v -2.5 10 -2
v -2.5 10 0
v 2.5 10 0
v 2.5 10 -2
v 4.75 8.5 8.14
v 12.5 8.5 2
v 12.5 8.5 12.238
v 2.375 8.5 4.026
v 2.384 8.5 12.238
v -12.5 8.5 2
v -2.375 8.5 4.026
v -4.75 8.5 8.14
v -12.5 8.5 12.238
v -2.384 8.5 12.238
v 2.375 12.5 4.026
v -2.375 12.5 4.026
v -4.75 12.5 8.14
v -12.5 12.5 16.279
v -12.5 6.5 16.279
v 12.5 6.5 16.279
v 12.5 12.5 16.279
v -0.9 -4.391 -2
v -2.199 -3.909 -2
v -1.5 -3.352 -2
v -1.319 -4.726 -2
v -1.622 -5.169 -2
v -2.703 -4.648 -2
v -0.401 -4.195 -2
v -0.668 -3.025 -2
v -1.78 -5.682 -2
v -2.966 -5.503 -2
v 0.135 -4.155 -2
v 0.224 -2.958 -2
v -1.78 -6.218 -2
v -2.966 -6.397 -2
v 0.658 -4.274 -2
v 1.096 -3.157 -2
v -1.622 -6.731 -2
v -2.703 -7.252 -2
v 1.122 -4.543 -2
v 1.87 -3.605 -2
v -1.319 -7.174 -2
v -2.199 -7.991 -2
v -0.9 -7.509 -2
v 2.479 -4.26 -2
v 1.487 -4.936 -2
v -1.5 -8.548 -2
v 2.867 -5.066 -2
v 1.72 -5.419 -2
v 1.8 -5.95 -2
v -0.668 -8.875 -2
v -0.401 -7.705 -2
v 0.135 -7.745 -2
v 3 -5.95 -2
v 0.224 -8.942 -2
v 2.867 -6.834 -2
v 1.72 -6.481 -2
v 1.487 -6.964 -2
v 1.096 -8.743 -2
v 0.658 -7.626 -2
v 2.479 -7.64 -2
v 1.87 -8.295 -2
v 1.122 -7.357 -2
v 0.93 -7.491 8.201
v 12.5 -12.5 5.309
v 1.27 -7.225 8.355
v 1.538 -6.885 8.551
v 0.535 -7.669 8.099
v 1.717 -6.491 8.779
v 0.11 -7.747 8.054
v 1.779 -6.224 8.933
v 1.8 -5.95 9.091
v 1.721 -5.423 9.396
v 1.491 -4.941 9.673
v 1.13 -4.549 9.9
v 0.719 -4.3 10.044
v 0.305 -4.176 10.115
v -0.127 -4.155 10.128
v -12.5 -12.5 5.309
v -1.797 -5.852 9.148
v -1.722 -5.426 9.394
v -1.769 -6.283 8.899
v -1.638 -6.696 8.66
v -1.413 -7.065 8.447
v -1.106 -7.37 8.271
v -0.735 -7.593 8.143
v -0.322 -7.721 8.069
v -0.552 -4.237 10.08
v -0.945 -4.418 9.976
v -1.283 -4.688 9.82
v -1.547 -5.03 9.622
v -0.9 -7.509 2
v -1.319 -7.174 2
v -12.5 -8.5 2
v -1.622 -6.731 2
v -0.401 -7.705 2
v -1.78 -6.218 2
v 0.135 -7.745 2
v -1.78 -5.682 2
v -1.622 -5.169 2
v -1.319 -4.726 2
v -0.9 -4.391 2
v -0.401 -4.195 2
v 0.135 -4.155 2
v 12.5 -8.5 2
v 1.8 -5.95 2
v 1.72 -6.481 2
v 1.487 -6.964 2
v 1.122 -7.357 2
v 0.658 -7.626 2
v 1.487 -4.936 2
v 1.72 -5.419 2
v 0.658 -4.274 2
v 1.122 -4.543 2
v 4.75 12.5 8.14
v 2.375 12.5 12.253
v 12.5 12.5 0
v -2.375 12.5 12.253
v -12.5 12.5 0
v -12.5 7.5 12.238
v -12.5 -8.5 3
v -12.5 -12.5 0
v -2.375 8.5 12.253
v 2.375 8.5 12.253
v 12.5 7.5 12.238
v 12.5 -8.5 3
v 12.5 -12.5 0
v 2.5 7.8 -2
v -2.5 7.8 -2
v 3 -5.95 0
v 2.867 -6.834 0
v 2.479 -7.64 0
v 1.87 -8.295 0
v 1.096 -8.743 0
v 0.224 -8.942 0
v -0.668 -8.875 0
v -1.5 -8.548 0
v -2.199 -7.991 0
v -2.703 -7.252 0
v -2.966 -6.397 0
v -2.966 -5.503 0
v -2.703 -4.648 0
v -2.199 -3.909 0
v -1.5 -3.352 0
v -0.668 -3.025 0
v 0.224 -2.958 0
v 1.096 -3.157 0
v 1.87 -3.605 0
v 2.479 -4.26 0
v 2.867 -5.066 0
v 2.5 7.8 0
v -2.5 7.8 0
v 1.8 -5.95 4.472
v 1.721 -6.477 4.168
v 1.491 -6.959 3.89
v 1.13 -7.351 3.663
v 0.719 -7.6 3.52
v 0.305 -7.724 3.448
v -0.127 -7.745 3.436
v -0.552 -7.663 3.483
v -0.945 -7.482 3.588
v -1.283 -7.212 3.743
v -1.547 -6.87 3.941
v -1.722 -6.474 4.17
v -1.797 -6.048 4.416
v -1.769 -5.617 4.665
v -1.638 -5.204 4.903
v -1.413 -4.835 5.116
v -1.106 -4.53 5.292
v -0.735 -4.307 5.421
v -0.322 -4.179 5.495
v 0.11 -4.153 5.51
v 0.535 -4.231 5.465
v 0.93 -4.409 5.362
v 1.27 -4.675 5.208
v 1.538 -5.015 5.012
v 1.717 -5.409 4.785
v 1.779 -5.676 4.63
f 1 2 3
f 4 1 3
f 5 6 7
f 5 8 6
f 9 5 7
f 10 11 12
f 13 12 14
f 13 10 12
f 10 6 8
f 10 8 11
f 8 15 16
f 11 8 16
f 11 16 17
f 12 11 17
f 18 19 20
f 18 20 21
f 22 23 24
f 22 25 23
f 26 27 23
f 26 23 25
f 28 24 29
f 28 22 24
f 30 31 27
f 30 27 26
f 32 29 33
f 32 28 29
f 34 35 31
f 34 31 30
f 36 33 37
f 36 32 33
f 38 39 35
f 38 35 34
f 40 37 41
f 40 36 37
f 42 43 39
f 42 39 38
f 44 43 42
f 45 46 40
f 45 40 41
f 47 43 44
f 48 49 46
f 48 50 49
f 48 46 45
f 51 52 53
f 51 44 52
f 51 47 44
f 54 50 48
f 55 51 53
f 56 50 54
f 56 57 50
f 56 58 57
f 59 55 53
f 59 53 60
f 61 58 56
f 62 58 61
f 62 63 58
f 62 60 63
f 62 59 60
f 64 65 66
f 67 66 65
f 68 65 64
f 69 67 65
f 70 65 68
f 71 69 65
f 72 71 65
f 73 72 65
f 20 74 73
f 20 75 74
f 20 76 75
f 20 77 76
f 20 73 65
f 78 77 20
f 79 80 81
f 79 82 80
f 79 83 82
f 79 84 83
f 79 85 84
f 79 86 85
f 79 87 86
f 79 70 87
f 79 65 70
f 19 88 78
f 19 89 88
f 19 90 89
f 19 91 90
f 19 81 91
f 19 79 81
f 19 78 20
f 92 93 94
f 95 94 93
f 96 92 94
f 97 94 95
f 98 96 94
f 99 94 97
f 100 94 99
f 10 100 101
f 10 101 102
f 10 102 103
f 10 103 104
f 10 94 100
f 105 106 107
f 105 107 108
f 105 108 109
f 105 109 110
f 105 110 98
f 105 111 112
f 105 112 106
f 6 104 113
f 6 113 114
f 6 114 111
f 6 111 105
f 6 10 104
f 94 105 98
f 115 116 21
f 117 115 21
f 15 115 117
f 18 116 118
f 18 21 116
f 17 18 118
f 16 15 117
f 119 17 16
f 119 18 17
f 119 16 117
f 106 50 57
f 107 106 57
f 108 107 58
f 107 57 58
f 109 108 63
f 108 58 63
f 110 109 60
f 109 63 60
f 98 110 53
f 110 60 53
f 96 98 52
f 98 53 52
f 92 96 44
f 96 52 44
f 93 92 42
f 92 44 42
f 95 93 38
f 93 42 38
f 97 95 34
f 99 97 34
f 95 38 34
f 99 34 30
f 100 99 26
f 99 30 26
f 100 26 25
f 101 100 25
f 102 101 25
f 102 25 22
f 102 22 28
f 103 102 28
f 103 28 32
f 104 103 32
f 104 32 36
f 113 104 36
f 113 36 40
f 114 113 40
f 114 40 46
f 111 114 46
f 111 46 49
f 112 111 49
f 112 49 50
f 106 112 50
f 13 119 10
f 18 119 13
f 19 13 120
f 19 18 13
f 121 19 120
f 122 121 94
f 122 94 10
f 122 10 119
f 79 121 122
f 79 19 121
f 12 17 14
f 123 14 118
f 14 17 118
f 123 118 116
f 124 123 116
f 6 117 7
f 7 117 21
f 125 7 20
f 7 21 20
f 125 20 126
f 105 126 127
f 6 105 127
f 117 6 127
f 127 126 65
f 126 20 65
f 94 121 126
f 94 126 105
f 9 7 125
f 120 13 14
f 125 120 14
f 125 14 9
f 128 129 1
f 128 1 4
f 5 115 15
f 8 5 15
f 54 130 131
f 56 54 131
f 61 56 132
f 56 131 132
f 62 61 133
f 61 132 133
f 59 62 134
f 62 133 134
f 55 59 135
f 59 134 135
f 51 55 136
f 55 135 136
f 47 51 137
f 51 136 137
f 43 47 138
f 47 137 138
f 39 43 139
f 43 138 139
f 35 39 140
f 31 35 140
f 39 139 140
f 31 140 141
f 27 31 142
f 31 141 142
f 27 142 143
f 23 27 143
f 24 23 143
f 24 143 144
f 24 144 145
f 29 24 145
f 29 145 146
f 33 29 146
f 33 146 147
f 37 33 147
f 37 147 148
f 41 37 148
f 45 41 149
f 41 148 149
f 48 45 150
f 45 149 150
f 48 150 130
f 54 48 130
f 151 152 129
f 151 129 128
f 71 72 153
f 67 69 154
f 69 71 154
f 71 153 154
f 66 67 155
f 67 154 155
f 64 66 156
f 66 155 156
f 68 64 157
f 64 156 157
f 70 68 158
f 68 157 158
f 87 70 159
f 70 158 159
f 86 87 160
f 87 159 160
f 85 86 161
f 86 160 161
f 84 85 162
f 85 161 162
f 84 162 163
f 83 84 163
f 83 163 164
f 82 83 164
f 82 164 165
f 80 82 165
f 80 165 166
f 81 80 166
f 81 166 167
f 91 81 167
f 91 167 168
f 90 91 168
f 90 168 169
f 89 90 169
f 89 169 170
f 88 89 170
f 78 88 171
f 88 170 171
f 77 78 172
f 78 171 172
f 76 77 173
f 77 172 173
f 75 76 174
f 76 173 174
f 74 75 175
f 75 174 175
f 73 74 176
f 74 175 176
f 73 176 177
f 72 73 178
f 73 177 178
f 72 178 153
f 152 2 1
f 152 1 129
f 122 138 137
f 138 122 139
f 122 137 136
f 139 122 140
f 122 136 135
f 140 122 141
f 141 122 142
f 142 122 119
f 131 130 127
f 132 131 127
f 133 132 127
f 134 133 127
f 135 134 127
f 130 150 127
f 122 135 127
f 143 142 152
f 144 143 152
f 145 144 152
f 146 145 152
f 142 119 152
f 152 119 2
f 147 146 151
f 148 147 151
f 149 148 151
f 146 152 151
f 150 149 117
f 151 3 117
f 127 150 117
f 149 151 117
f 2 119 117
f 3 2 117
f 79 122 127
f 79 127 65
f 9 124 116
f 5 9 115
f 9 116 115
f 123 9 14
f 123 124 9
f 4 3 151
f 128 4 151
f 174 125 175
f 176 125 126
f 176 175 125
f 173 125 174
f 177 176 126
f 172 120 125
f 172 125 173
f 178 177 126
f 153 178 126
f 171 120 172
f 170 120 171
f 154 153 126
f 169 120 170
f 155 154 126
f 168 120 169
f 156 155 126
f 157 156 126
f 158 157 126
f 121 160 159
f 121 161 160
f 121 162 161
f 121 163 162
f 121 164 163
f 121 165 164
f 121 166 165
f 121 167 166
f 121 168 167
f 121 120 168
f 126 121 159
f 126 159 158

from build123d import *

# Parameters (mm, degrees)
F0_W     = 25
F0_H     = 25
F1_DEPTH = 2
F3_DEPTH = 25
F4_W     = 5
F4_H     = 2.2
F4_R     = 3
F5_DEPTH = 2
F6_R     = 1.8
F7_DEPTH = 18.280056
F9_DEPTH = 4


with BuildPart() as f1:
    # F0 (on Top) → F1 (new body)
    with BuildSketch(Plane.XY):
        Rectangle(F0_W, F0_H)
    extrude(amount=F1_DEPTH)

    # F2 (on face) → F3 (join, through all)
    with BuildSketch(Plane(origin=(-12.5, 0, 0), x_dir=(0, -1, 0), z_dir=(-1, 0, 0))):
        Polygon((-12.5, 16.279056), (-12.5, 2), (-8.5, 2), (-8.5, 12.237604), (-7.5, 12.237604), (8.5, 3), (8.5, 2), (12.5, 2), (12.5, 5.309401), (-6.5, 16.279056), align=None)
    extrude(amount=-F3_DEPTH)

    # F4 (on face) → F5 (join)
    with BuildSketch(Plane(origin=(0, 0, 0), x_dir=(1, 0, 0), z_dir=(0, 0, -1))):
        with Locations((0, -8.9)):
            Rectangle(F4_W, F4_H)
        with Locations((0, 5.95)):
            Circle(F4_R)
    extrude(amount=F5_DEPTH)

    # F6 (on face) → F7 (cut, through all)
    with BuildSketch(Plane(origin=(0, 0, -2), x_dir=(1, 0, 0), z_dir=(0, 0, -1))):
        with Locations((0, 5.95)):
            Circle(F6_R)
    extrude(amount=-F7_DEPTH, mode=Mode.SUBTRACT)

    # F8 (on face) → F9 (cut, through all)
    with BuildSketch(Plane(origin=(0, 12.5, 0), x_dir=(-1, 0, 0), z_dir=(0, 1, 0))):
        Polygon((2.375, 4.025907), (4.75, 8.139528), (2.375, 12.253149), (-2.375, 12.253149), (-4.75, 8.139528), (-2.375, 4.025907), align=None)
    extrude(amount=-F9_DEPTH, mode=Mode.SUBTRACT)


solid = f1.part
